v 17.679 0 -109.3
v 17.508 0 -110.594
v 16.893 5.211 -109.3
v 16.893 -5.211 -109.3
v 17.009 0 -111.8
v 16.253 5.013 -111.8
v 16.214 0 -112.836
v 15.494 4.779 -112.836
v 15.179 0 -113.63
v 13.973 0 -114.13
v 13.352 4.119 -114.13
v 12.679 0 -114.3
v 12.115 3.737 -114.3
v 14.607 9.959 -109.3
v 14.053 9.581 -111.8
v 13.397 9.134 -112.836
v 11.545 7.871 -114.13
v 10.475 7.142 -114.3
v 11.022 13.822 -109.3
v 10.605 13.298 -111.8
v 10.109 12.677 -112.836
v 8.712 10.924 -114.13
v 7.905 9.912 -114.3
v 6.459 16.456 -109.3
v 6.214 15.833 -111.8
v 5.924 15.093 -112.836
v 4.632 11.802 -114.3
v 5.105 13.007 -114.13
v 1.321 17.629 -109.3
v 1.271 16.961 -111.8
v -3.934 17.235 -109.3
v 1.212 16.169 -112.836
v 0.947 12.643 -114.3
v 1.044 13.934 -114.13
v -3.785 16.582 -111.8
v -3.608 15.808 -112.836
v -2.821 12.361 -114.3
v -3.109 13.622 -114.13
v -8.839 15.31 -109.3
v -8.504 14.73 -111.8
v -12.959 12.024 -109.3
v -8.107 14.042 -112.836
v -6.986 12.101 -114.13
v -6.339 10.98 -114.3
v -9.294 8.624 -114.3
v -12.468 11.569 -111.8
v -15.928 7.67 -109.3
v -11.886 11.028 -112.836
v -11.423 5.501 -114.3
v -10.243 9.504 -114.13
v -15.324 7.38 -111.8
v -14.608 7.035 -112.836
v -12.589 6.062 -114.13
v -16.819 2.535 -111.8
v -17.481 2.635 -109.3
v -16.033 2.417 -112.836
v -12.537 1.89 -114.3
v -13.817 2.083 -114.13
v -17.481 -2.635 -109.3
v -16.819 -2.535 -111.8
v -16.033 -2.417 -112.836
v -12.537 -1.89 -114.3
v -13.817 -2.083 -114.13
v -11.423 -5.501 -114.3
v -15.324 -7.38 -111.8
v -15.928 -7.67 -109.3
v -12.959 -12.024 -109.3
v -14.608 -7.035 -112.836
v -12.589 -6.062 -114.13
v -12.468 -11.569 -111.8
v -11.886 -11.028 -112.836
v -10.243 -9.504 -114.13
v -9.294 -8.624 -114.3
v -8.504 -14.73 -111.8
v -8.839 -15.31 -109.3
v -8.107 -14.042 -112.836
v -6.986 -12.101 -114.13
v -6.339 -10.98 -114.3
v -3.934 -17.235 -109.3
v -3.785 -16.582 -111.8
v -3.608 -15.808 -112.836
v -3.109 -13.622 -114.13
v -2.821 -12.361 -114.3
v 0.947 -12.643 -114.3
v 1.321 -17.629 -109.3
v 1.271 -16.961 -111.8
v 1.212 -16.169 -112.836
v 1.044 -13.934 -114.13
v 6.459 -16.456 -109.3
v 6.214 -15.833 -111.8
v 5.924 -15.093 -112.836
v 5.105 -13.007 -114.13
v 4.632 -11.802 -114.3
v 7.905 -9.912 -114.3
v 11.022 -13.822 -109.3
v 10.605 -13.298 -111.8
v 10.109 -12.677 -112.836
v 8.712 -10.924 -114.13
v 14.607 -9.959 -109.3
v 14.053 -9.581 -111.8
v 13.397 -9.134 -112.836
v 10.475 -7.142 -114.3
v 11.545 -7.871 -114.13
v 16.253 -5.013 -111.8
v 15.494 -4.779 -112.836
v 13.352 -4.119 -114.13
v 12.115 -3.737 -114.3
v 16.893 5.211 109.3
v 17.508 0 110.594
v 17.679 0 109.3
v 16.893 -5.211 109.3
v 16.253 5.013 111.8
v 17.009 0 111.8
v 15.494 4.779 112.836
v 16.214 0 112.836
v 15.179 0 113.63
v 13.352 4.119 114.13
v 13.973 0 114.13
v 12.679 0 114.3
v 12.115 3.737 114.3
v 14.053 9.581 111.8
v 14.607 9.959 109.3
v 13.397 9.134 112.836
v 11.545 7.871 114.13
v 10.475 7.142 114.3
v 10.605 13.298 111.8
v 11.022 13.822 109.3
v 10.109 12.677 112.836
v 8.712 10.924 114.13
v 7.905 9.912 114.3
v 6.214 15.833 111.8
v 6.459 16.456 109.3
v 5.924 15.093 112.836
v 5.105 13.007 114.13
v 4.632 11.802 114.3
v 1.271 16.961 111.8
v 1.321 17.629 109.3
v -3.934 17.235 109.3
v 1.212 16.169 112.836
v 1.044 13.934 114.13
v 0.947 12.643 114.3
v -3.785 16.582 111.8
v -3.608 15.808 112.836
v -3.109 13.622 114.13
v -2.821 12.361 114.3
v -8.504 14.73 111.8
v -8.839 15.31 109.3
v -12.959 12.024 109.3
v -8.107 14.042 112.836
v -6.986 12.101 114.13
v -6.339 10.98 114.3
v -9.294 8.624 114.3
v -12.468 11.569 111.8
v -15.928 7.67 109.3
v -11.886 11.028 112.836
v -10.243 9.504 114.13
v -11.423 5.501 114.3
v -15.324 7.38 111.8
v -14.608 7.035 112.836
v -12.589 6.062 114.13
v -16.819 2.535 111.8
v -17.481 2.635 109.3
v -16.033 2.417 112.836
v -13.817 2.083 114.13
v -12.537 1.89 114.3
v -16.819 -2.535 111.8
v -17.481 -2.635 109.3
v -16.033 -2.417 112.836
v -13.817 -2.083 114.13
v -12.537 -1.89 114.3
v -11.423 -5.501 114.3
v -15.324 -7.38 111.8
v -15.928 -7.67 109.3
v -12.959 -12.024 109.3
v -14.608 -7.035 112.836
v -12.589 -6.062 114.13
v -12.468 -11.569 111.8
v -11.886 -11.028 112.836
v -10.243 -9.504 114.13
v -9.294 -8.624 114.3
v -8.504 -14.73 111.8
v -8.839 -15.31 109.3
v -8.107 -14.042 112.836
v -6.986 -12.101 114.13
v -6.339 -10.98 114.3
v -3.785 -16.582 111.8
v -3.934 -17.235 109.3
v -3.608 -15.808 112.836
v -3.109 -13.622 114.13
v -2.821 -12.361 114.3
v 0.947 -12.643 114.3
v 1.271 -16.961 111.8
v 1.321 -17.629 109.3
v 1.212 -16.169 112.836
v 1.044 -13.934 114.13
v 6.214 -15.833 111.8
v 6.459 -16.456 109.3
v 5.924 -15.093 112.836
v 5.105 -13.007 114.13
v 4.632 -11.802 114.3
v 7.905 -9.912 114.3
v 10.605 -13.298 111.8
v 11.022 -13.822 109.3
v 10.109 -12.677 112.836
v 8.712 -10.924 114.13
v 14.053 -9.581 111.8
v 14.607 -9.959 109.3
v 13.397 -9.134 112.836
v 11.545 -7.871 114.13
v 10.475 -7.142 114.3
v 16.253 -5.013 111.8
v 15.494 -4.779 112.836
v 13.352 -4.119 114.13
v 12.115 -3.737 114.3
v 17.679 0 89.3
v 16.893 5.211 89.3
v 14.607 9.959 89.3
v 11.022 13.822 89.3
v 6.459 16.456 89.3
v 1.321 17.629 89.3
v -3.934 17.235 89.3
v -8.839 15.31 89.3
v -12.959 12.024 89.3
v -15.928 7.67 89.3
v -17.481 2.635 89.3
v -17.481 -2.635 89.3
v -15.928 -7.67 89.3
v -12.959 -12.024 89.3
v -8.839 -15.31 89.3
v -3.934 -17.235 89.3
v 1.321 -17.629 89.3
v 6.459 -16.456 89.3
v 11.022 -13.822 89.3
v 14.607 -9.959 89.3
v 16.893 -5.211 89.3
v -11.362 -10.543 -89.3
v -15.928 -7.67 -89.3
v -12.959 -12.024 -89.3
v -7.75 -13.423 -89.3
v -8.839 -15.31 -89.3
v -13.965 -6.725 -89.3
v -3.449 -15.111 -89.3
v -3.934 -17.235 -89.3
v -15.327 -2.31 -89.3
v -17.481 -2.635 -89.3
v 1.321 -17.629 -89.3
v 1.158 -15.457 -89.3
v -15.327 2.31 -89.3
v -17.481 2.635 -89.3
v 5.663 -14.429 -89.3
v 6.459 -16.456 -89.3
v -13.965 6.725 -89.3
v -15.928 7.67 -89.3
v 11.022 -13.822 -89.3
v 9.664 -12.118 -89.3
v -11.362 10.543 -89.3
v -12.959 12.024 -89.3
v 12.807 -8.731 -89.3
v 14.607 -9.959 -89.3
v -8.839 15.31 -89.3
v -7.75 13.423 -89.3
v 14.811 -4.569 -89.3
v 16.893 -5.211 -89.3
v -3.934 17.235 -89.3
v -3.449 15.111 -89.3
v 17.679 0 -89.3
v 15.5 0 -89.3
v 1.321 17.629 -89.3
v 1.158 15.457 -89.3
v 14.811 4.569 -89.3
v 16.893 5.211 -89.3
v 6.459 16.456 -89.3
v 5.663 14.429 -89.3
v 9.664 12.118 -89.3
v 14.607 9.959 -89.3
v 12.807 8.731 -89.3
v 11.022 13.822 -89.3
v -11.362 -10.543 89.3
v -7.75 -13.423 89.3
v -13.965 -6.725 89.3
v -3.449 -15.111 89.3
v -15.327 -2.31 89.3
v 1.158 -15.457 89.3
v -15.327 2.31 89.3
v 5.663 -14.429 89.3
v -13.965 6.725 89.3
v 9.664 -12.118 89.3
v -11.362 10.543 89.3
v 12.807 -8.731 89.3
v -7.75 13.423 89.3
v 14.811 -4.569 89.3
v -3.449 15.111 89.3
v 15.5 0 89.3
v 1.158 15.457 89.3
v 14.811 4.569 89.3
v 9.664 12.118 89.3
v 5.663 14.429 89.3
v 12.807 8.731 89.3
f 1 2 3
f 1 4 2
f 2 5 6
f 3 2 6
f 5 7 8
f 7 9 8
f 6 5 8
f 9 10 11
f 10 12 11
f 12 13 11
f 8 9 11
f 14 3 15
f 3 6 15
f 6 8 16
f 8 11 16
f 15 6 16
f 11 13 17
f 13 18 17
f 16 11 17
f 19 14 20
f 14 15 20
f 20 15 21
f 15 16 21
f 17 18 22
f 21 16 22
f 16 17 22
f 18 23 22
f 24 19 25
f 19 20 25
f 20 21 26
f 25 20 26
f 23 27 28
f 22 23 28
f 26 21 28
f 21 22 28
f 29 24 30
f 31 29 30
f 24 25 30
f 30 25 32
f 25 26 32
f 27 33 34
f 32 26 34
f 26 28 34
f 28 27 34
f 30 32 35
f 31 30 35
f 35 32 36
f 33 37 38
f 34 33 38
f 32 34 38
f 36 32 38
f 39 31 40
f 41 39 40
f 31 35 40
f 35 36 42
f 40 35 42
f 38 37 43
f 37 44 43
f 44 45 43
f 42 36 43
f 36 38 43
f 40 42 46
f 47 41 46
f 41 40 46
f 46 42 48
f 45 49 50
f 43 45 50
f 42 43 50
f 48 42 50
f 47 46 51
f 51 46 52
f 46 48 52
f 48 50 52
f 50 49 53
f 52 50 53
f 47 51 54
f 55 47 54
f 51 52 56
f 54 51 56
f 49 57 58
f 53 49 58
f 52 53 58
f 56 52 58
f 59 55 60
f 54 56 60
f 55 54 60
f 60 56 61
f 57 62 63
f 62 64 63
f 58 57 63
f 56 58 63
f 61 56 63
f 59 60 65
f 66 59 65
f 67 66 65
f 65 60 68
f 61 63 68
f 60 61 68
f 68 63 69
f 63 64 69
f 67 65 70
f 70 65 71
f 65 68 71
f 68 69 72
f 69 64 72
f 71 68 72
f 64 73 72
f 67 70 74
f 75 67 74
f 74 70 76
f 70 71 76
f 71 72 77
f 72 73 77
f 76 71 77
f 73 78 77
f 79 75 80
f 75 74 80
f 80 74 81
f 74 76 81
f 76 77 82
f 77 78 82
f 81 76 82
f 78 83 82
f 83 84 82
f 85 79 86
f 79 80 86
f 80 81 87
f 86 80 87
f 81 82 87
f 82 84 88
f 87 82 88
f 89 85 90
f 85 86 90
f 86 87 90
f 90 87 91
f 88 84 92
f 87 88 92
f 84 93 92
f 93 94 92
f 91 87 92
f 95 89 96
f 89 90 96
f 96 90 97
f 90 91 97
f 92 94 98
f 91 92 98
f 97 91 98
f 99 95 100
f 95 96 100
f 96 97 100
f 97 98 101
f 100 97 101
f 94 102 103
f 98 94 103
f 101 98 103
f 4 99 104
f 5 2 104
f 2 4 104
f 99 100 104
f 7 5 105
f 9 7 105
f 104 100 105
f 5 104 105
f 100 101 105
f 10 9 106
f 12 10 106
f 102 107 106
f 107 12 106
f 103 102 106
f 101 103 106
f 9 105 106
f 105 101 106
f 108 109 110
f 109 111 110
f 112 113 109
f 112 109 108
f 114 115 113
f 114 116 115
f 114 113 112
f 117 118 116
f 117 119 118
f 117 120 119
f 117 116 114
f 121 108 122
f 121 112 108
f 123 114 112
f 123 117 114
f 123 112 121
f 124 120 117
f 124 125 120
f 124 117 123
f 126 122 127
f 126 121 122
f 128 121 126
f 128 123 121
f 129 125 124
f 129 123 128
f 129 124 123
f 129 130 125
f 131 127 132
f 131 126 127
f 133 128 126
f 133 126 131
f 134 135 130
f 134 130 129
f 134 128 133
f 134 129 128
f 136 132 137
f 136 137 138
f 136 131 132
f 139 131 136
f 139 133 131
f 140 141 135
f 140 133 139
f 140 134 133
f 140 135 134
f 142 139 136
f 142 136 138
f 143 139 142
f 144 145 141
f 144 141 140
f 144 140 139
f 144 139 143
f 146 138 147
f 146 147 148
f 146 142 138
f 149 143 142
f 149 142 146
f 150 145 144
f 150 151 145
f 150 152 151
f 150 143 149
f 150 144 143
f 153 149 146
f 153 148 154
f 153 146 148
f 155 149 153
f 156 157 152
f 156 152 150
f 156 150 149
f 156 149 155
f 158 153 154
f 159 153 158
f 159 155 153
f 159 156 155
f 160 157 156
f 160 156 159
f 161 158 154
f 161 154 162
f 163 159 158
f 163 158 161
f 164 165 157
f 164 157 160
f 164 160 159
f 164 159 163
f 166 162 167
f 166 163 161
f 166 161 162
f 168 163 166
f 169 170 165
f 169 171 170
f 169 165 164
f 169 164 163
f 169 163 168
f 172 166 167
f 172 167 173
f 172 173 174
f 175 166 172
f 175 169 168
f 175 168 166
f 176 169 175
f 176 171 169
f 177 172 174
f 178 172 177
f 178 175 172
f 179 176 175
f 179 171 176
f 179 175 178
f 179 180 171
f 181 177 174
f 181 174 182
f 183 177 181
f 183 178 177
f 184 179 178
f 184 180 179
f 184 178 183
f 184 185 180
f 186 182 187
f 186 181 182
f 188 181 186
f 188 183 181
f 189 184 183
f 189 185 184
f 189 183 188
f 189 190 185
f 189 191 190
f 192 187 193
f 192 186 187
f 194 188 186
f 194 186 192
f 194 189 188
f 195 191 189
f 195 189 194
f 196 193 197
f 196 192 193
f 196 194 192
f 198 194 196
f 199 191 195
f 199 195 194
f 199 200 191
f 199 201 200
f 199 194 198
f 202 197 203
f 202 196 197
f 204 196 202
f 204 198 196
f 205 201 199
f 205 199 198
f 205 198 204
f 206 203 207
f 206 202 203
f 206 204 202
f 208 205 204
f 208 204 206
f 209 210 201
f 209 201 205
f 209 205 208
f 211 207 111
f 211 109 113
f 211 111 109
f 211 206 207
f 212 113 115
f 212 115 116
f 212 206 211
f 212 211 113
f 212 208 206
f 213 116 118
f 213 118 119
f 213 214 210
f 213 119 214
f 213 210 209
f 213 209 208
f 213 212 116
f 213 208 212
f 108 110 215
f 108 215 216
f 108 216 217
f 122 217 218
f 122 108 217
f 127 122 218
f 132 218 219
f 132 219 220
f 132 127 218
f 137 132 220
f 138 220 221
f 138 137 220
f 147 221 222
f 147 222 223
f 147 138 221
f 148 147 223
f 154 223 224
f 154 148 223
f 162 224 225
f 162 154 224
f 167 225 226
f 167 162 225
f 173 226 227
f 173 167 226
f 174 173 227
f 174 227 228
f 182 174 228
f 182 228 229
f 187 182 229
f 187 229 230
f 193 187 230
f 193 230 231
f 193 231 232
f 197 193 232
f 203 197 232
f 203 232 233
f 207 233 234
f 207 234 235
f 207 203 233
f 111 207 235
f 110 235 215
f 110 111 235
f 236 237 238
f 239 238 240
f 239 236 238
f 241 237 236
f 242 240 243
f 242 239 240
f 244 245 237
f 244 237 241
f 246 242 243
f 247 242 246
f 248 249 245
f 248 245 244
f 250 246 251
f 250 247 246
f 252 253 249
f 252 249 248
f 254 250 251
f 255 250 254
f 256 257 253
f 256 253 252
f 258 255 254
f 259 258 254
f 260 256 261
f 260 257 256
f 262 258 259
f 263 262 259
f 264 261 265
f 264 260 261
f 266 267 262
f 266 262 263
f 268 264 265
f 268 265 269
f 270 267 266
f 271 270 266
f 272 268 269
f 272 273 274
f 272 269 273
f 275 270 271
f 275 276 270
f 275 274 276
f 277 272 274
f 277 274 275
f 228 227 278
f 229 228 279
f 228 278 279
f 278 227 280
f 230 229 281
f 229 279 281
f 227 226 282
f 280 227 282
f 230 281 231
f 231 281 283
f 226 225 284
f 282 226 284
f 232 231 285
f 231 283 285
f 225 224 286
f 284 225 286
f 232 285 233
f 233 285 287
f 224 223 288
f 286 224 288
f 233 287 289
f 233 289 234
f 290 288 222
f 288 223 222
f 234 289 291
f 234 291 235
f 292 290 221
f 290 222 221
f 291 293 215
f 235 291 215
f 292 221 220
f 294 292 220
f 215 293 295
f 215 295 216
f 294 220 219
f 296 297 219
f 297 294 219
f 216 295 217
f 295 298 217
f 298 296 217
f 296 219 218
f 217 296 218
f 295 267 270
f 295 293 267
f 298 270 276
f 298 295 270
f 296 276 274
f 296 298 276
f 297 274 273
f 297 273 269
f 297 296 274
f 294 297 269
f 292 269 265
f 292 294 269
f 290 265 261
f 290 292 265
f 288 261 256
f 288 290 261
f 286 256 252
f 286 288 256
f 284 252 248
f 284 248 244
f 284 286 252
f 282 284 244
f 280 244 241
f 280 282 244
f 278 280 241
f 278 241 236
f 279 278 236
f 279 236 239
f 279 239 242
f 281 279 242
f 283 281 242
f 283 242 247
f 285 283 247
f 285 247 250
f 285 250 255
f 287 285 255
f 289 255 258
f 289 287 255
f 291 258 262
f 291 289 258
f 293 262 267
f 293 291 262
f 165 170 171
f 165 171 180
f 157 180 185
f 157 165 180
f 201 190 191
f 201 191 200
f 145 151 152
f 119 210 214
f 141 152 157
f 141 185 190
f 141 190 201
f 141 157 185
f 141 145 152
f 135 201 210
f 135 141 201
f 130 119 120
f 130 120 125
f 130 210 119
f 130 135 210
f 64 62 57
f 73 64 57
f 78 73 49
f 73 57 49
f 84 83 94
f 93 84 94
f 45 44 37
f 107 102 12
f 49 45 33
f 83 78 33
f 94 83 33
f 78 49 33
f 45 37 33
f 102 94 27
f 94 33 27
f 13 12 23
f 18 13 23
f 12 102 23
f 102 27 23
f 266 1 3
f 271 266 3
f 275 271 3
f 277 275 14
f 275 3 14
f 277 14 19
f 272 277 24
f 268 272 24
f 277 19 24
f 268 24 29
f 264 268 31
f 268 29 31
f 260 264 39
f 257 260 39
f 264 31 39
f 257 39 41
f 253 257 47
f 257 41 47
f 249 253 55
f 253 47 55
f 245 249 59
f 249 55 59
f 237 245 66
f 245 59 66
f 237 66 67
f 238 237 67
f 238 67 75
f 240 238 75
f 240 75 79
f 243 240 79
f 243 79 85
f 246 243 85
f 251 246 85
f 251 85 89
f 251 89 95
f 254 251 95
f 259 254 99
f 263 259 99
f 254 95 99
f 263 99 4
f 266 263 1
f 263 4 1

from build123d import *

# Parameters (mm, degrees)
F0_R          = 15.5
F1_DEPTH      = 114.3
F1_DEPTH_BACK = 114.3
F2_R          = 17.6785322686
F2_R_2        = 15.5
F3_DEPTH      = 25
F4_R          = 5


# Not quite as in the source:
# - a pattern or mirror of a feature is missing from the dataset's text; its kind, count and spacing are read off the source's solid


with BuildPart() as f1:
    # F0 (on Top) → F1 (new body, two sides)
    with BuildSketch(Plane.XY) as f1_sk:
        Circle(F0_R)
    extrude(amount=F1_DEPTH)
    extrude(f1_sk.sketch, amount=-F1_DEPTH_BACK)

    # F2 (on face) → F3 (join)
    with BuildSketch(Plane.XY.offset(114.3)):
        Circle(F2_R)
        Circle(F2_R_2, mode=Mode.SUBTRACT)
        Circle(F2_R_2)
    f3 = extrude(amount=-F3_DEPTH)

    # F3_copies: F3 across plane
    add(f3.mirror(Plane(origin=(0, 0, 0), x_dir=(-1, 0, 0), z_dir=(0, 0, -1))))

    # F4
    f4_edges = [f1.edges().sort_by_distance(p)[0] for p in [
        (-17.678532, 0, 114.3),
        (-17.678532, 0, -114.3),
    ]]
    fillet(f4_edges, radius=F4_R)


solid = f1.part
